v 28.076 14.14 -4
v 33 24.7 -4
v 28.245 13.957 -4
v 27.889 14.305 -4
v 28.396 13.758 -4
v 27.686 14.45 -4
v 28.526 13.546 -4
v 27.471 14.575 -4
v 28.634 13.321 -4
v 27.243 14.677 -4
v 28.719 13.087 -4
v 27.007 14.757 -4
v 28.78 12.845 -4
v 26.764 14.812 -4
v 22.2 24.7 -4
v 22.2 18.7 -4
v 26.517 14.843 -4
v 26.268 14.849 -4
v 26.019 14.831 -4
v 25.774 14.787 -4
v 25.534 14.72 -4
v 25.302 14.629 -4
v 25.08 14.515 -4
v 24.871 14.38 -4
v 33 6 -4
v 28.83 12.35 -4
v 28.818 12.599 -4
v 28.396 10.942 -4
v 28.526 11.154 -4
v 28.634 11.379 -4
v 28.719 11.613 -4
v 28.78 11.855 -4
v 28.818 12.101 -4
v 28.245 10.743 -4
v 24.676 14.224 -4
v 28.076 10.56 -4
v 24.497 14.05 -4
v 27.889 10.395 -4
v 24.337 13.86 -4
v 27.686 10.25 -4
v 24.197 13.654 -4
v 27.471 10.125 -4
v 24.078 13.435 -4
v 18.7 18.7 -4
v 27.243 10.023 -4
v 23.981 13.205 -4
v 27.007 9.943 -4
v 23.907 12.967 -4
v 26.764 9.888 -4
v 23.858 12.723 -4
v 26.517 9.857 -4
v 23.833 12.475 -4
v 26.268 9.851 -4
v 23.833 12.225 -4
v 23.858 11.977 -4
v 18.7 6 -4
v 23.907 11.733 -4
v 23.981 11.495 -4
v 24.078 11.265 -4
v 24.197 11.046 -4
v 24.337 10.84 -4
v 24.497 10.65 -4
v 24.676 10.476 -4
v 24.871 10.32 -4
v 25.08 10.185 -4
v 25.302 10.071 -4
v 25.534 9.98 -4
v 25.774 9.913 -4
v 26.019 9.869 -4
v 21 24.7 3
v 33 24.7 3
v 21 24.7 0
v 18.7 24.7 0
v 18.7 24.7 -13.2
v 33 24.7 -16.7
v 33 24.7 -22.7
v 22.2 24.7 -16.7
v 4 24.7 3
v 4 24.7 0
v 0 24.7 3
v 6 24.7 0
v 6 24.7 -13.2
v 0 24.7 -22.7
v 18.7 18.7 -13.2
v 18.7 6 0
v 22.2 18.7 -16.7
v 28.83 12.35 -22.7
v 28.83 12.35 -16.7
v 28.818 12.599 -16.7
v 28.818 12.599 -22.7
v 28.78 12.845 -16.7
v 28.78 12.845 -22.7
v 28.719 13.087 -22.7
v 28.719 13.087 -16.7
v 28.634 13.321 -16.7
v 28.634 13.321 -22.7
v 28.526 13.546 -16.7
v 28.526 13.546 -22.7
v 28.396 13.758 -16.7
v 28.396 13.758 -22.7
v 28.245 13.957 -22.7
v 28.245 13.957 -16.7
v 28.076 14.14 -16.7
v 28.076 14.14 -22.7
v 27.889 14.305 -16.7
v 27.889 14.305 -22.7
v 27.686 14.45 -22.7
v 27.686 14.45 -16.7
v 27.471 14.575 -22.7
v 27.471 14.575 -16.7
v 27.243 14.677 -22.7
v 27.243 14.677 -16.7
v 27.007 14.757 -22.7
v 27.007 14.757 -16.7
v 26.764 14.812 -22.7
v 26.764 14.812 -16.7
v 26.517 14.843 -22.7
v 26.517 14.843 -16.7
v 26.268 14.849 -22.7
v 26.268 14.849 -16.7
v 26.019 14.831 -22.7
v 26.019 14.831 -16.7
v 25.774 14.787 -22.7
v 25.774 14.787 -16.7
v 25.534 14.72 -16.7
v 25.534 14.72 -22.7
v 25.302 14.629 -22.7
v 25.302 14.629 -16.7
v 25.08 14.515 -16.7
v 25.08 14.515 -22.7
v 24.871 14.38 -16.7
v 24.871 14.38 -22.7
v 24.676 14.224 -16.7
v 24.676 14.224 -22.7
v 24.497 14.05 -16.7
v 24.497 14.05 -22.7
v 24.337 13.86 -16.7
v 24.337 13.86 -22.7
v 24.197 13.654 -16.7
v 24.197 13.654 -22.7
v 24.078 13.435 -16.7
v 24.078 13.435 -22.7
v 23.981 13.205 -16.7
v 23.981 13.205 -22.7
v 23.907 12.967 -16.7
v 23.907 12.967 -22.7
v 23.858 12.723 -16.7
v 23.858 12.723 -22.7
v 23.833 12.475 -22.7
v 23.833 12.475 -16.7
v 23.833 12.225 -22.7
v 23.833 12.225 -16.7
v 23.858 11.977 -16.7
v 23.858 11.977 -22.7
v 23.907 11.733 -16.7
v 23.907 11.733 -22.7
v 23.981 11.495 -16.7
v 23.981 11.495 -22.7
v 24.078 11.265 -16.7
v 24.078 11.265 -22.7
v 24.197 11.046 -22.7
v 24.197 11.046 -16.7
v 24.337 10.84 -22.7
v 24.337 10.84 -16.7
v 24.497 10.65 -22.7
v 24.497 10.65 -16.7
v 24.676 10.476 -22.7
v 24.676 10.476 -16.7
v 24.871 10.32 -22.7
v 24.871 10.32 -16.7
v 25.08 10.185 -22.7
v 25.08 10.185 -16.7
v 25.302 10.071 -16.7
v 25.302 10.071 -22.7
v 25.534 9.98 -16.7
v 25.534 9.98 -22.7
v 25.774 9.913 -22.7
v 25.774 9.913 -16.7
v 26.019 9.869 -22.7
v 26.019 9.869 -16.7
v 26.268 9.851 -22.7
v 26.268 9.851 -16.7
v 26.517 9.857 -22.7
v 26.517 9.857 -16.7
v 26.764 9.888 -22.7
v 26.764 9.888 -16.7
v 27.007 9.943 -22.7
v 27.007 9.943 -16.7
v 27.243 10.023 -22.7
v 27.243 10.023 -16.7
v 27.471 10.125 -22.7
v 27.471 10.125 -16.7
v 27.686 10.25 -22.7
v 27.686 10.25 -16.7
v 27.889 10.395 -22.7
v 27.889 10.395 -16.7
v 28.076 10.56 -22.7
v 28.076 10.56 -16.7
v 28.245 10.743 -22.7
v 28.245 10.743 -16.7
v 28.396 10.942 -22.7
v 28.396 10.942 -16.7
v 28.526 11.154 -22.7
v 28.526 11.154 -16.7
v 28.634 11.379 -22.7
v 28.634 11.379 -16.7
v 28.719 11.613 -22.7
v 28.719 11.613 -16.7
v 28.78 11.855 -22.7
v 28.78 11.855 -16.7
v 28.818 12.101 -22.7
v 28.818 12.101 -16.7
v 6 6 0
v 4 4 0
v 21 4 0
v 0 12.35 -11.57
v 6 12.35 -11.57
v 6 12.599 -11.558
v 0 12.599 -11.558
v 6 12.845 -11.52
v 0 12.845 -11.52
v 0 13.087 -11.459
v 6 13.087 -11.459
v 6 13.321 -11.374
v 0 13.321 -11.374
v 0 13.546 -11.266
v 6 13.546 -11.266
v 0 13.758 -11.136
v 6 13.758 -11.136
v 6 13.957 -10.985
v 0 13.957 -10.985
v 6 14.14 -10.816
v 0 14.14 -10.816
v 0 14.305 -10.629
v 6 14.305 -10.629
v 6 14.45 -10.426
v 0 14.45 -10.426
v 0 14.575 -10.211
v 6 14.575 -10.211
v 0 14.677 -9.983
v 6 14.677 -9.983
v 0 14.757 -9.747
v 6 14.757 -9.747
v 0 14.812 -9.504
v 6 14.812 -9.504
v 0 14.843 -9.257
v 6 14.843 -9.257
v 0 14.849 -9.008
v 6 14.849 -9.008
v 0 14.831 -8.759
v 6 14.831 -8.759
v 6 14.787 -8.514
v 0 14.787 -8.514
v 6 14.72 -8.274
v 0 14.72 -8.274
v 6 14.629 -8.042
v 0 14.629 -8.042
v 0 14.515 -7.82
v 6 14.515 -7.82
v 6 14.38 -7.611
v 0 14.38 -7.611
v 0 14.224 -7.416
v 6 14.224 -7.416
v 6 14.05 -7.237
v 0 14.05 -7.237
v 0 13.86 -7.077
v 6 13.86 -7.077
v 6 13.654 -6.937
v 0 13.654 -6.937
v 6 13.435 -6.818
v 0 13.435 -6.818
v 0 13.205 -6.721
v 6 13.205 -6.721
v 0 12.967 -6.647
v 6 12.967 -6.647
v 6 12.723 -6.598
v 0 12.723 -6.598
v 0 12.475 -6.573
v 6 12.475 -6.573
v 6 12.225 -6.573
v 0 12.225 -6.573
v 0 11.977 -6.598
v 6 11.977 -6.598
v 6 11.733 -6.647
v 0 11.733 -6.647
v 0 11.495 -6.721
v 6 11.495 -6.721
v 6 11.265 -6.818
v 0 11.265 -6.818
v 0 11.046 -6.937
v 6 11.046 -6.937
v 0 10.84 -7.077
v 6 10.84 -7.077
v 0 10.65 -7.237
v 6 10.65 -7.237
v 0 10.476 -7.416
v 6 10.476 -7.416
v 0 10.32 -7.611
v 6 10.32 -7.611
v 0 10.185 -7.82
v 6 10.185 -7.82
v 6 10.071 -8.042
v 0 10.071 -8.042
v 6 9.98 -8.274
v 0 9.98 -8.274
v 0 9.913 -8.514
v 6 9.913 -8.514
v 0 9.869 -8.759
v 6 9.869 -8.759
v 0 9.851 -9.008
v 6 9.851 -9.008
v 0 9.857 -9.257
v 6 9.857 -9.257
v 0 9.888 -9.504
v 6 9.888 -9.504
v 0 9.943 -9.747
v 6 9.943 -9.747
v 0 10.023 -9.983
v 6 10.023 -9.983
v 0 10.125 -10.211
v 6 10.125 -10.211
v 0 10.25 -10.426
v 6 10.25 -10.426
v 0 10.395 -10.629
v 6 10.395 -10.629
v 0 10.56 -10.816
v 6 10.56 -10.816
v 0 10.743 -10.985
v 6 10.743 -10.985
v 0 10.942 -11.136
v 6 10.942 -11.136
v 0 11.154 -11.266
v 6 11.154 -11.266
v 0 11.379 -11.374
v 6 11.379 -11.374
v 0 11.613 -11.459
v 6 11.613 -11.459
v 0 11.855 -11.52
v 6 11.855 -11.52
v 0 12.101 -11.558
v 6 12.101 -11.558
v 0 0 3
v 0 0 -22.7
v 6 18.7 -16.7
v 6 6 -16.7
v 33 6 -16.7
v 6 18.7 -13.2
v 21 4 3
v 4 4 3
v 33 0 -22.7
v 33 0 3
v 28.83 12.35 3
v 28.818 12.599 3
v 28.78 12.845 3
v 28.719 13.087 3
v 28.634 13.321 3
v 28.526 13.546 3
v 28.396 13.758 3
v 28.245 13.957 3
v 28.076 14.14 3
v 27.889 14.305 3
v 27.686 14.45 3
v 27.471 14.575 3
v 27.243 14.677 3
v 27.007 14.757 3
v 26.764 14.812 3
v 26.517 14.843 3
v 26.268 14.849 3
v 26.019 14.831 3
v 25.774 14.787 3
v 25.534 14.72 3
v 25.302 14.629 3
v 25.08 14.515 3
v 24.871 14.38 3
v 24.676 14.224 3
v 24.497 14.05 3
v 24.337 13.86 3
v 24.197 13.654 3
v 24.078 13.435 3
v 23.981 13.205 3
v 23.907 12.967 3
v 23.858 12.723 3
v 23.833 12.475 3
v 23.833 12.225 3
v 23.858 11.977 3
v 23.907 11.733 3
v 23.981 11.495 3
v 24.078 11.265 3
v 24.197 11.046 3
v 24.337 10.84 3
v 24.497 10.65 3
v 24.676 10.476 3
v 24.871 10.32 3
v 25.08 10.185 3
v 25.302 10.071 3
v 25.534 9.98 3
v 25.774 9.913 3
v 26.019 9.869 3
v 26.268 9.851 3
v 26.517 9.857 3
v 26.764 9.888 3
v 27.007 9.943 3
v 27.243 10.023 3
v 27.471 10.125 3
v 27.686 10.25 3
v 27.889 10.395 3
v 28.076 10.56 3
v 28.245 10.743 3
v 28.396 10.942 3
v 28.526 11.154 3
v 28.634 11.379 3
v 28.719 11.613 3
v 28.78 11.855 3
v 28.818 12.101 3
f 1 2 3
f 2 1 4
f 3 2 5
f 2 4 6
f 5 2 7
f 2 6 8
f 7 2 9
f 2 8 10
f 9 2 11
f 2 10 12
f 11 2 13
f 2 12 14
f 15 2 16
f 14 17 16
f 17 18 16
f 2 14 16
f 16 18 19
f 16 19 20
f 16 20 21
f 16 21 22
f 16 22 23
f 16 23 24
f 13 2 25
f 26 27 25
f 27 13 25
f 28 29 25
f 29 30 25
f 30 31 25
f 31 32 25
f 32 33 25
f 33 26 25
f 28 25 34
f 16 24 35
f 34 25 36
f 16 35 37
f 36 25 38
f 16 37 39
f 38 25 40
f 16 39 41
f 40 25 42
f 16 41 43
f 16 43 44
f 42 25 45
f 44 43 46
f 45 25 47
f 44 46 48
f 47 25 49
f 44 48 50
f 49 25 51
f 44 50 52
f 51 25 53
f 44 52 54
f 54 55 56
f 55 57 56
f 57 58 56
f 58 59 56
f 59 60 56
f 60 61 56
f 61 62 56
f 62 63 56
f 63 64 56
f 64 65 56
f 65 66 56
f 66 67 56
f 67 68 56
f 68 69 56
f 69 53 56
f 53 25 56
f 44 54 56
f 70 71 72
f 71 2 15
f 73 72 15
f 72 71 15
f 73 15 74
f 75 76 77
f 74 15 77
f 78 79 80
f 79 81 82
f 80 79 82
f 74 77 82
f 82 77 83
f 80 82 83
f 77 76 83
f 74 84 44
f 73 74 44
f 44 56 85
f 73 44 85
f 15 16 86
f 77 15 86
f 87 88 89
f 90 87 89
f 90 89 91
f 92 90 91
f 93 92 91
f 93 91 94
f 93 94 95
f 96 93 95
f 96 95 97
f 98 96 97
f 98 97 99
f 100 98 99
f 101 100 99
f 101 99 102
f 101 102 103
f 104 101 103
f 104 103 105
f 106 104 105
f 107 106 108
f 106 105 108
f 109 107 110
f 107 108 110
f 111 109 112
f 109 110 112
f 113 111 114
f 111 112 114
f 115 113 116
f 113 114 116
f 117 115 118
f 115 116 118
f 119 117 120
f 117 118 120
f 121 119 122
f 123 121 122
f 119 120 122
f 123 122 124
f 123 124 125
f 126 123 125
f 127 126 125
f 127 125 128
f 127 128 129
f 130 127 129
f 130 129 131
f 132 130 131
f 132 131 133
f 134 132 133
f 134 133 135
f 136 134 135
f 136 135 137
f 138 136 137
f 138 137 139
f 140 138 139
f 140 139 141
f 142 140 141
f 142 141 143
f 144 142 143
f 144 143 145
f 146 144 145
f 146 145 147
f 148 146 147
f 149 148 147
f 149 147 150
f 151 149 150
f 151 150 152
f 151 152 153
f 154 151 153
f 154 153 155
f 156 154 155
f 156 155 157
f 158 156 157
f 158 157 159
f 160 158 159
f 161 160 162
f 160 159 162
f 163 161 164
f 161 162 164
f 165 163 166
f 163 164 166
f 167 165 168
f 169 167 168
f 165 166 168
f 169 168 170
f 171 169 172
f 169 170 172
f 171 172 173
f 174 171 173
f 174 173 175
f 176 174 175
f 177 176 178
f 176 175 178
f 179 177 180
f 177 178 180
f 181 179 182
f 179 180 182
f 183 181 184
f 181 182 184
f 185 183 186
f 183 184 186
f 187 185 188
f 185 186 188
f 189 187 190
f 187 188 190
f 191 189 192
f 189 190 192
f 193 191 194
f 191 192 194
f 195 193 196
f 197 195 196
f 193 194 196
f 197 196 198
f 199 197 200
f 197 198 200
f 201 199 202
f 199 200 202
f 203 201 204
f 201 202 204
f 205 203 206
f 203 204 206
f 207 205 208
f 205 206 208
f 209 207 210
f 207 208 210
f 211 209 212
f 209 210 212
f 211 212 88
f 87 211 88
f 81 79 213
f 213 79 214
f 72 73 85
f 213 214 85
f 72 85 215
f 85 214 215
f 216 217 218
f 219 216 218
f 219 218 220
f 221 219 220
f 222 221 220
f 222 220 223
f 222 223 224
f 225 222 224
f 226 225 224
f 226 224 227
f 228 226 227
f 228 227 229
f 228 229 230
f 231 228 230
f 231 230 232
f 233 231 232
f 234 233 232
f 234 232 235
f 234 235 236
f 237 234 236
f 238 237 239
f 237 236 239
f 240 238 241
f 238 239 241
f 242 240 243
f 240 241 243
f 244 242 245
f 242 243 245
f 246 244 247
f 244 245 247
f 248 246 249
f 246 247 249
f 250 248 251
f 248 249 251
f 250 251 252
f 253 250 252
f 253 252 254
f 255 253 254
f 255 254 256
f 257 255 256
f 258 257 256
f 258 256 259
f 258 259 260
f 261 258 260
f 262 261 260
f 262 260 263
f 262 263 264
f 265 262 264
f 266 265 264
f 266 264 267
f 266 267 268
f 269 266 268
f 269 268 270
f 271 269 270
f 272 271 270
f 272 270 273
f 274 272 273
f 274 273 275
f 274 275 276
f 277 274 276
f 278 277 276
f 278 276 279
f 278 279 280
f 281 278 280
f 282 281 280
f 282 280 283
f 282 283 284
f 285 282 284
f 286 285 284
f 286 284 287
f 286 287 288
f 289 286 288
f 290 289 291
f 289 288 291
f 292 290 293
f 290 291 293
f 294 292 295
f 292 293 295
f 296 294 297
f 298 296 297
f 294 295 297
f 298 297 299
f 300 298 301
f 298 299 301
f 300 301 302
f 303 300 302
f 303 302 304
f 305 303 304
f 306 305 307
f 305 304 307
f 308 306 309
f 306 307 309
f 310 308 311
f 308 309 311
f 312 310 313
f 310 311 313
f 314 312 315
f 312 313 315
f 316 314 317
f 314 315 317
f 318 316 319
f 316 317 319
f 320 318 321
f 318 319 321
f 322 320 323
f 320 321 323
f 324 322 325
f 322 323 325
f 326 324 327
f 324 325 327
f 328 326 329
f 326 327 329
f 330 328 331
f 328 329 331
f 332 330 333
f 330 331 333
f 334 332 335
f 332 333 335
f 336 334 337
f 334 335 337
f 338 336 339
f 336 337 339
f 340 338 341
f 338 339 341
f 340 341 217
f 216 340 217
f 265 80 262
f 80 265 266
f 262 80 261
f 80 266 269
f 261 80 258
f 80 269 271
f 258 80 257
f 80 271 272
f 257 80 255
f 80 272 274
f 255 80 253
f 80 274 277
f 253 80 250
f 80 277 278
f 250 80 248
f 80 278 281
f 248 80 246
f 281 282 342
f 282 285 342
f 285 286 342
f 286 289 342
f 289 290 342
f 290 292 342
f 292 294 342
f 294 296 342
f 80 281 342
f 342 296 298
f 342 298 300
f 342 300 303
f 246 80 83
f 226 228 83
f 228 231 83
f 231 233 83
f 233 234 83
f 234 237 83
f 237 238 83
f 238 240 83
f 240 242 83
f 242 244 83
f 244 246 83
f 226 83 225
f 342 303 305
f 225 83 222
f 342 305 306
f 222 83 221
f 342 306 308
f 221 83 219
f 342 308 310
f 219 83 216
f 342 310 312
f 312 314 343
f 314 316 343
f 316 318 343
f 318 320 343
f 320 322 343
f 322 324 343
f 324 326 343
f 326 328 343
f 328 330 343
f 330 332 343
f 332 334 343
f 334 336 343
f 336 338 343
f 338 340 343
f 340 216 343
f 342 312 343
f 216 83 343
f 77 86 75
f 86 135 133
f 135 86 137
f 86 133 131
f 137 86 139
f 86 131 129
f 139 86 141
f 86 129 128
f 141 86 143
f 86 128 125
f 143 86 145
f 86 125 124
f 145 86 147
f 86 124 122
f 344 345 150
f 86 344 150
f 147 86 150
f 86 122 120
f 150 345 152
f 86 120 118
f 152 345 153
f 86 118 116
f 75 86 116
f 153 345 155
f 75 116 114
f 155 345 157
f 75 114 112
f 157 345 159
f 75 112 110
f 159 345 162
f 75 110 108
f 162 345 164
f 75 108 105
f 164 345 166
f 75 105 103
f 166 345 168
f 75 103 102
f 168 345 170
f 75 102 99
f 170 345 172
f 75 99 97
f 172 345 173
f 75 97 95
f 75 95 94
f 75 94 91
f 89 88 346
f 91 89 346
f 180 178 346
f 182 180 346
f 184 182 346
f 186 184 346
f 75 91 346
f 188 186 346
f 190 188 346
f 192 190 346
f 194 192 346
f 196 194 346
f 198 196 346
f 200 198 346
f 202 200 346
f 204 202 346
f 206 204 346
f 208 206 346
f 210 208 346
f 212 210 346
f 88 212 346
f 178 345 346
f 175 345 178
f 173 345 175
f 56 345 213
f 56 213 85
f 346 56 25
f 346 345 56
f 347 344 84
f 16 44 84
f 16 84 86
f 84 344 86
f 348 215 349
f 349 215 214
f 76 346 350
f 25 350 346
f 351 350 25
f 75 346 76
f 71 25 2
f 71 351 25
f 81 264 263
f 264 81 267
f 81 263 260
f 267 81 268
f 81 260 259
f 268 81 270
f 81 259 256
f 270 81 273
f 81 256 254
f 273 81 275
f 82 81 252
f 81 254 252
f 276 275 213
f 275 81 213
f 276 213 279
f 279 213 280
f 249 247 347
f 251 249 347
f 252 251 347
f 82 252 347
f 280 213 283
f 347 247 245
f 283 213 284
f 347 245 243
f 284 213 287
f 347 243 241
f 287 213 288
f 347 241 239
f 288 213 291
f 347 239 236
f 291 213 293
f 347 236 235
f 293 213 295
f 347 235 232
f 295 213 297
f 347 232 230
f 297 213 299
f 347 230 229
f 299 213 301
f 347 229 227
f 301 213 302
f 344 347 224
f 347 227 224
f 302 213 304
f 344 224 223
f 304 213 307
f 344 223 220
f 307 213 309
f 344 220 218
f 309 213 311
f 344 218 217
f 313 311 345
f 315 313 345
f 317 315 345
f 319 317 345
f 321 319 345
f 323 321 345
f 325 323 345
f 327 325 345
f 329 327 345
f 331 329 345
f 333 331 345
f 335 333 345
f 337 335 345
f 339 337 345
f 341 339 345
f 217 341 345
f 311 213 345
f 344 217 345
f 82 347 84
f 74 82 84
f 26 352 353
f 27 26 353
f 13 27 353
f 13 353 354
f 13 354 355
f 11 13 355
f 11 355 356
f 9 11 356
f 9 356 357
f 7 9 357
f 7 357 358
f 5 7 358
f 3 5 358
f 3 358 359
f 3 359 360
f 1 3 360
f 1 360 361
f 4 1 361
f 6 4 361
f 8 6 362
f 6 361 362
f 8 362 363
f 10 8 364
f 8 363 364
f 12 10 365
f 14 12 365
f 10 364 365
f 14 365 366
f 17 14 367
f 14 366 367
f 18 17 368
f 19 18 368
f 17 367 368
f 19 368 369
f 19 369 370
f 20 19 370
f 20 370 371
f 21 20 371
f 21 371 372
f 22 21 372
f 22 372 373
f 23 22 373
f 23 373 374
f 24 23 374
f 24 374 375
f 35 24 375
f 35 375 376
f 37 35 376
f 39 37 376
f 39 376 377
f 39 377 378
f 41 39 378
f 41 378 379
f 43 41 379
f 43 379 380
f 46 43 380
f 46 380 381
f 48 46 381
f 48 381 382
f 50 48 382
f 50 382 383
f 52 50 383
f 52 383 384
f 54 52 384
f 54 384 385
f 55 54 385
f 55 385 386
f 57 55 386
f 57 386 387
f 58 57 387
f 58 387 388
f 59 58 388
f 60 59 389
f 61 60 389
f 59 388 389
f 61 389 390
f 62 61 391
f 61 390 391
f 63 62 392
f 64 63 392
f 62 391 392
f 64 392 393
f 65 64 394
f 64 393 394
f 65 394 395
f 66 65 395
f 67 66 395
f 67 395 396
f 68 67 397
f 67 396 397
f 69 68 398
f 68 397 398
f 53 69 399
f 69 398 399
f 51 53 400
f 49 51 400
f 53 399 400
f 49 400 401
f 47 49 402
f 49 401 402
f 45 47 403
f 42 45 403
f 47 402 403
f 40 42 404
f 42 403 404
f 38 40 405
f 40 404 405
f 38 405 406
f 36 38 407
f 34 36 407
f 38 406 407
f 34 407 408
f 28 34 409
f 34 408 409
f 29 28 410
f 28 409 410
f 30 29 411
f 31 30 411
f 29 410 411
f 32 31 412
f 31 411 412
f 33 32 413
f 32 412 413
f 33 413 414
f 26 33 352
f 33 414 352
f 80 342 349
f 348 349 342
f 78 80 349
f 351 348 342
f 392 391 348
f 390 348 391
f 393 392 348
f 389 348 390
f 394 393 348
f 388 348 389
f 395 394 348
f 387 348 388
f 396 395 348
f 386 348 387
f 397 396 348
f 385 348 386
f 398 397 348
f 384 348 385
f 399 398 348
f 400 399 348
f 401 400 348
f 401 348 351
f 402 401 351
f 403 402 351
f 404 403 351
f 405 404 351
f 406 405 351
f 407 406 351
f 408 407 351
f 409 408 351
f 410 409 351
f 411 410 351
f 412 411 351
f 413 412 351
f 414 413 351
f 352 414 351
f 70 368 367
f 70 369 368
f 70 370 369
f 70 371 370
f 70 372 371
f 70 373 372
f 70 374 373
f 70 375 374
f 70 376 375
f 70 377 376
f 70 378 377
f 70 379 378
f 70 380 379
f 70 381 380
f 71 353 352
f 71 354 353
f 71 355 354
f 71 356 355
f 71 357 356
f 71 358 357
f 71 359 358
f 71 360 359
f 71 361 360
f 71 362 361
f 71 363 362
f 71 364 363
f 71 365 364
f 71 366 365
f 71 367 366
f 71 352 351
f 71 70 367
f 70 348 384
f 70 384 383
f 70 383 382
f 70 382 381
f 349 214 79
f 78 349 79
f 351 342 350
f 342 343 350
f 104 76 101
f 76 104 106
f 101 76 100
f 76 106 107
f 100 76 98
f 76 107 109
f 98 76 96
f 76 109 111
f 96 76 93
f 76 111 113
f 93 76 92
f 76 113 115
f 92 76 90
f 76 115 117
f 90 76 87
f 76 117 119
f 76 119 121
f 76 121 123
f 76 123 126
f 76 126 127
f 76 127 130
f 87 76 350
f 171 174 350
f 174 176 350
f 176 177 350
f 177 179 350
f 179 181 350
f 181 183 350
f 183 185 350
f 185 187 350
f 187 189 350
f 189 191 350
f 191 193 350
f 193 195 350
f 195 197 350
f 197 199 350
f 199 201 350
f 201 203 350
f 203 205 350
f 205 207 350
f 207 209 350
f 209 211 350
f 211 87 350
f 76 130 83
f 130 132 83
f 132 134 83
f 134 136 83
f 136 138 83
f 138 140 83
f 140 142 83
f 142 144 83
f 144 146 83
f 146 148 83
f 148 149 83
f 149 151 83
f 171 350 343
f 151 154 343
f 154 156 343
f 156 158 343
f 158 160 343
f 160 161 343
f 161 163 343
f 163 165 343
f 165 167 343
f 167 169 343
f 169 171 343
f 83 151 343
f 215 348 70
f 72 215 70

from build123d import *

# Parameters (mm, degrees)
SKETCH_3_W          = 33
SKETCH_3_H          = 22.7
EXTRUDE_2_DEPTH     = 6
SKETCH_4_W          = 14.3
SKETCH_4_H          = 4
EXTRUDE_3_DEPTH     = 12.7
SKETCH_5_R          = 2.5
CUT_EXTRUDE_2_DEPTH = 45.203845987
SKETCH_6_R          = 2.5
CUT_EXTRUDE_3_DEPTH = 40.924679084
SKETCH_7_W          = 12.7
SKETCH_7_H          = 3.5
EXTRUDE_4_DEPTH     = 6
EXTRUDE_START       = 3
SKETCH_8_W          = 12
SKETCH_8_H          = 24.7
SKETCH_8_R          = 2.5
EXTRUDE_5_DEPTH     = 3
EXTRUDE_6_DEPTH     = 3


with BuildPart() as part:
    # 草图3 → 凸台-拉伸2 (new body)
    with BuildSketch(Plane(origin=(0, 0, 0), x_dir=(1, 0, 0), z_dir=(0, 1, 0))):
        with Locations((16.5, 11.35)):
            Rectangle(SKETCH_3_W, SKETCH_3_H)
    extrude(amount=EXTRUDE_2_DEPTH)

    # 草图4 → 凸台-拉伸3 (add)
    with BuildSketch(Plane(origin=(0, 6, 0), x_dir=(1, 0, 0), z_dir=(0, 1, 0))):
        with Locations((25.85, 2)):
            Rectangle(SKETCH_4_W, SKETCH_4_H)
        Polygon((0, 0), (6, 0), (6, 16.7), (33, 16.7), (33, 22.7), (0, 22.7), align=None)
    extrude(amount=EXTRUDE_3_DEPTH)

    # 草图5 → 切除-拉伸2 (cut, through all)
    with BuildSketch(Plane.XY):
        with Locations((26.33, 12.35)):
            Circle(SKETCH_5_R)
    extrude(amount=-CUT_EXTRUDE_2_DEPTH, mode=Mode.SUBTRACT)

    # 草图6 → 切除-拉伸3 (cut, through all)
    with BuildSketch(Plane(origin=(6, 0, 0), x_dir=(0, 0, -1), z_dir=(1, 0, 0))):
        with Locations((9.07, 12.35)):
            Circle(SKETCH_6_R)
    extrude(amount=-CUT_EXTRUDE_3_DEPTH, mode=Mode.SUBTRACT)

    # 草图7 → 凸台-拉伸4 (add)
    with BuildSketch(Plane(origin=(0, 18.7, 0), x_dir=(1, 0, 0), z_dir=(0, 1, 0))):
        Polygon((0, 22.7), (0, 0), (6, 0), (6, 13.2), (6, 16.7), (18.7, 16.7), (18.7, 22.7), align=None)
        Polygon((33, 22.7), (18.7, 22.7), (18.7, 16.7), (22.2, 16.7), (33, 16.7), align=None)
        Polygon((22.2, 16.7), (18.7, 16.7), (18.7, 13.2), (18.7, 4), (18.7, 0), (33, 0), (33, 4), (22.2, 4), align=None)
        with Locations((12.35, 14.95)):
            Rectangle(SKETCH_7_W, SKETCH_7_H)
    extrude(amount=EXTRUDE_4_DEPTH)

    # 草图8 → 凸台-拉伸5 (add)
    with BuildSketch(Plane.XY.offset(EXTRUDE_START)):
        with Locations((27, 12.35)):
            Rectangle(SKETCH_8_W, SKETCH_8_H)
        with Locations((26.33, 12.35)):
            Circle(SKETCH_8_R, mode=Mode.SUBTRACT)
    extrude(amount=-EXTRUDE_5_DEPTH)

    # 草图9 → 凸台-拉伸6 (add)
    with BuildSketch(Plane.XY):
        Polygon((0, 24.7), (0, 0), (21, 0), (21, 4), (4, 4), (4, 24.7), align=None)
    extrude(amount=EXTRUDE_6_DEPTH)


solid = part.part
